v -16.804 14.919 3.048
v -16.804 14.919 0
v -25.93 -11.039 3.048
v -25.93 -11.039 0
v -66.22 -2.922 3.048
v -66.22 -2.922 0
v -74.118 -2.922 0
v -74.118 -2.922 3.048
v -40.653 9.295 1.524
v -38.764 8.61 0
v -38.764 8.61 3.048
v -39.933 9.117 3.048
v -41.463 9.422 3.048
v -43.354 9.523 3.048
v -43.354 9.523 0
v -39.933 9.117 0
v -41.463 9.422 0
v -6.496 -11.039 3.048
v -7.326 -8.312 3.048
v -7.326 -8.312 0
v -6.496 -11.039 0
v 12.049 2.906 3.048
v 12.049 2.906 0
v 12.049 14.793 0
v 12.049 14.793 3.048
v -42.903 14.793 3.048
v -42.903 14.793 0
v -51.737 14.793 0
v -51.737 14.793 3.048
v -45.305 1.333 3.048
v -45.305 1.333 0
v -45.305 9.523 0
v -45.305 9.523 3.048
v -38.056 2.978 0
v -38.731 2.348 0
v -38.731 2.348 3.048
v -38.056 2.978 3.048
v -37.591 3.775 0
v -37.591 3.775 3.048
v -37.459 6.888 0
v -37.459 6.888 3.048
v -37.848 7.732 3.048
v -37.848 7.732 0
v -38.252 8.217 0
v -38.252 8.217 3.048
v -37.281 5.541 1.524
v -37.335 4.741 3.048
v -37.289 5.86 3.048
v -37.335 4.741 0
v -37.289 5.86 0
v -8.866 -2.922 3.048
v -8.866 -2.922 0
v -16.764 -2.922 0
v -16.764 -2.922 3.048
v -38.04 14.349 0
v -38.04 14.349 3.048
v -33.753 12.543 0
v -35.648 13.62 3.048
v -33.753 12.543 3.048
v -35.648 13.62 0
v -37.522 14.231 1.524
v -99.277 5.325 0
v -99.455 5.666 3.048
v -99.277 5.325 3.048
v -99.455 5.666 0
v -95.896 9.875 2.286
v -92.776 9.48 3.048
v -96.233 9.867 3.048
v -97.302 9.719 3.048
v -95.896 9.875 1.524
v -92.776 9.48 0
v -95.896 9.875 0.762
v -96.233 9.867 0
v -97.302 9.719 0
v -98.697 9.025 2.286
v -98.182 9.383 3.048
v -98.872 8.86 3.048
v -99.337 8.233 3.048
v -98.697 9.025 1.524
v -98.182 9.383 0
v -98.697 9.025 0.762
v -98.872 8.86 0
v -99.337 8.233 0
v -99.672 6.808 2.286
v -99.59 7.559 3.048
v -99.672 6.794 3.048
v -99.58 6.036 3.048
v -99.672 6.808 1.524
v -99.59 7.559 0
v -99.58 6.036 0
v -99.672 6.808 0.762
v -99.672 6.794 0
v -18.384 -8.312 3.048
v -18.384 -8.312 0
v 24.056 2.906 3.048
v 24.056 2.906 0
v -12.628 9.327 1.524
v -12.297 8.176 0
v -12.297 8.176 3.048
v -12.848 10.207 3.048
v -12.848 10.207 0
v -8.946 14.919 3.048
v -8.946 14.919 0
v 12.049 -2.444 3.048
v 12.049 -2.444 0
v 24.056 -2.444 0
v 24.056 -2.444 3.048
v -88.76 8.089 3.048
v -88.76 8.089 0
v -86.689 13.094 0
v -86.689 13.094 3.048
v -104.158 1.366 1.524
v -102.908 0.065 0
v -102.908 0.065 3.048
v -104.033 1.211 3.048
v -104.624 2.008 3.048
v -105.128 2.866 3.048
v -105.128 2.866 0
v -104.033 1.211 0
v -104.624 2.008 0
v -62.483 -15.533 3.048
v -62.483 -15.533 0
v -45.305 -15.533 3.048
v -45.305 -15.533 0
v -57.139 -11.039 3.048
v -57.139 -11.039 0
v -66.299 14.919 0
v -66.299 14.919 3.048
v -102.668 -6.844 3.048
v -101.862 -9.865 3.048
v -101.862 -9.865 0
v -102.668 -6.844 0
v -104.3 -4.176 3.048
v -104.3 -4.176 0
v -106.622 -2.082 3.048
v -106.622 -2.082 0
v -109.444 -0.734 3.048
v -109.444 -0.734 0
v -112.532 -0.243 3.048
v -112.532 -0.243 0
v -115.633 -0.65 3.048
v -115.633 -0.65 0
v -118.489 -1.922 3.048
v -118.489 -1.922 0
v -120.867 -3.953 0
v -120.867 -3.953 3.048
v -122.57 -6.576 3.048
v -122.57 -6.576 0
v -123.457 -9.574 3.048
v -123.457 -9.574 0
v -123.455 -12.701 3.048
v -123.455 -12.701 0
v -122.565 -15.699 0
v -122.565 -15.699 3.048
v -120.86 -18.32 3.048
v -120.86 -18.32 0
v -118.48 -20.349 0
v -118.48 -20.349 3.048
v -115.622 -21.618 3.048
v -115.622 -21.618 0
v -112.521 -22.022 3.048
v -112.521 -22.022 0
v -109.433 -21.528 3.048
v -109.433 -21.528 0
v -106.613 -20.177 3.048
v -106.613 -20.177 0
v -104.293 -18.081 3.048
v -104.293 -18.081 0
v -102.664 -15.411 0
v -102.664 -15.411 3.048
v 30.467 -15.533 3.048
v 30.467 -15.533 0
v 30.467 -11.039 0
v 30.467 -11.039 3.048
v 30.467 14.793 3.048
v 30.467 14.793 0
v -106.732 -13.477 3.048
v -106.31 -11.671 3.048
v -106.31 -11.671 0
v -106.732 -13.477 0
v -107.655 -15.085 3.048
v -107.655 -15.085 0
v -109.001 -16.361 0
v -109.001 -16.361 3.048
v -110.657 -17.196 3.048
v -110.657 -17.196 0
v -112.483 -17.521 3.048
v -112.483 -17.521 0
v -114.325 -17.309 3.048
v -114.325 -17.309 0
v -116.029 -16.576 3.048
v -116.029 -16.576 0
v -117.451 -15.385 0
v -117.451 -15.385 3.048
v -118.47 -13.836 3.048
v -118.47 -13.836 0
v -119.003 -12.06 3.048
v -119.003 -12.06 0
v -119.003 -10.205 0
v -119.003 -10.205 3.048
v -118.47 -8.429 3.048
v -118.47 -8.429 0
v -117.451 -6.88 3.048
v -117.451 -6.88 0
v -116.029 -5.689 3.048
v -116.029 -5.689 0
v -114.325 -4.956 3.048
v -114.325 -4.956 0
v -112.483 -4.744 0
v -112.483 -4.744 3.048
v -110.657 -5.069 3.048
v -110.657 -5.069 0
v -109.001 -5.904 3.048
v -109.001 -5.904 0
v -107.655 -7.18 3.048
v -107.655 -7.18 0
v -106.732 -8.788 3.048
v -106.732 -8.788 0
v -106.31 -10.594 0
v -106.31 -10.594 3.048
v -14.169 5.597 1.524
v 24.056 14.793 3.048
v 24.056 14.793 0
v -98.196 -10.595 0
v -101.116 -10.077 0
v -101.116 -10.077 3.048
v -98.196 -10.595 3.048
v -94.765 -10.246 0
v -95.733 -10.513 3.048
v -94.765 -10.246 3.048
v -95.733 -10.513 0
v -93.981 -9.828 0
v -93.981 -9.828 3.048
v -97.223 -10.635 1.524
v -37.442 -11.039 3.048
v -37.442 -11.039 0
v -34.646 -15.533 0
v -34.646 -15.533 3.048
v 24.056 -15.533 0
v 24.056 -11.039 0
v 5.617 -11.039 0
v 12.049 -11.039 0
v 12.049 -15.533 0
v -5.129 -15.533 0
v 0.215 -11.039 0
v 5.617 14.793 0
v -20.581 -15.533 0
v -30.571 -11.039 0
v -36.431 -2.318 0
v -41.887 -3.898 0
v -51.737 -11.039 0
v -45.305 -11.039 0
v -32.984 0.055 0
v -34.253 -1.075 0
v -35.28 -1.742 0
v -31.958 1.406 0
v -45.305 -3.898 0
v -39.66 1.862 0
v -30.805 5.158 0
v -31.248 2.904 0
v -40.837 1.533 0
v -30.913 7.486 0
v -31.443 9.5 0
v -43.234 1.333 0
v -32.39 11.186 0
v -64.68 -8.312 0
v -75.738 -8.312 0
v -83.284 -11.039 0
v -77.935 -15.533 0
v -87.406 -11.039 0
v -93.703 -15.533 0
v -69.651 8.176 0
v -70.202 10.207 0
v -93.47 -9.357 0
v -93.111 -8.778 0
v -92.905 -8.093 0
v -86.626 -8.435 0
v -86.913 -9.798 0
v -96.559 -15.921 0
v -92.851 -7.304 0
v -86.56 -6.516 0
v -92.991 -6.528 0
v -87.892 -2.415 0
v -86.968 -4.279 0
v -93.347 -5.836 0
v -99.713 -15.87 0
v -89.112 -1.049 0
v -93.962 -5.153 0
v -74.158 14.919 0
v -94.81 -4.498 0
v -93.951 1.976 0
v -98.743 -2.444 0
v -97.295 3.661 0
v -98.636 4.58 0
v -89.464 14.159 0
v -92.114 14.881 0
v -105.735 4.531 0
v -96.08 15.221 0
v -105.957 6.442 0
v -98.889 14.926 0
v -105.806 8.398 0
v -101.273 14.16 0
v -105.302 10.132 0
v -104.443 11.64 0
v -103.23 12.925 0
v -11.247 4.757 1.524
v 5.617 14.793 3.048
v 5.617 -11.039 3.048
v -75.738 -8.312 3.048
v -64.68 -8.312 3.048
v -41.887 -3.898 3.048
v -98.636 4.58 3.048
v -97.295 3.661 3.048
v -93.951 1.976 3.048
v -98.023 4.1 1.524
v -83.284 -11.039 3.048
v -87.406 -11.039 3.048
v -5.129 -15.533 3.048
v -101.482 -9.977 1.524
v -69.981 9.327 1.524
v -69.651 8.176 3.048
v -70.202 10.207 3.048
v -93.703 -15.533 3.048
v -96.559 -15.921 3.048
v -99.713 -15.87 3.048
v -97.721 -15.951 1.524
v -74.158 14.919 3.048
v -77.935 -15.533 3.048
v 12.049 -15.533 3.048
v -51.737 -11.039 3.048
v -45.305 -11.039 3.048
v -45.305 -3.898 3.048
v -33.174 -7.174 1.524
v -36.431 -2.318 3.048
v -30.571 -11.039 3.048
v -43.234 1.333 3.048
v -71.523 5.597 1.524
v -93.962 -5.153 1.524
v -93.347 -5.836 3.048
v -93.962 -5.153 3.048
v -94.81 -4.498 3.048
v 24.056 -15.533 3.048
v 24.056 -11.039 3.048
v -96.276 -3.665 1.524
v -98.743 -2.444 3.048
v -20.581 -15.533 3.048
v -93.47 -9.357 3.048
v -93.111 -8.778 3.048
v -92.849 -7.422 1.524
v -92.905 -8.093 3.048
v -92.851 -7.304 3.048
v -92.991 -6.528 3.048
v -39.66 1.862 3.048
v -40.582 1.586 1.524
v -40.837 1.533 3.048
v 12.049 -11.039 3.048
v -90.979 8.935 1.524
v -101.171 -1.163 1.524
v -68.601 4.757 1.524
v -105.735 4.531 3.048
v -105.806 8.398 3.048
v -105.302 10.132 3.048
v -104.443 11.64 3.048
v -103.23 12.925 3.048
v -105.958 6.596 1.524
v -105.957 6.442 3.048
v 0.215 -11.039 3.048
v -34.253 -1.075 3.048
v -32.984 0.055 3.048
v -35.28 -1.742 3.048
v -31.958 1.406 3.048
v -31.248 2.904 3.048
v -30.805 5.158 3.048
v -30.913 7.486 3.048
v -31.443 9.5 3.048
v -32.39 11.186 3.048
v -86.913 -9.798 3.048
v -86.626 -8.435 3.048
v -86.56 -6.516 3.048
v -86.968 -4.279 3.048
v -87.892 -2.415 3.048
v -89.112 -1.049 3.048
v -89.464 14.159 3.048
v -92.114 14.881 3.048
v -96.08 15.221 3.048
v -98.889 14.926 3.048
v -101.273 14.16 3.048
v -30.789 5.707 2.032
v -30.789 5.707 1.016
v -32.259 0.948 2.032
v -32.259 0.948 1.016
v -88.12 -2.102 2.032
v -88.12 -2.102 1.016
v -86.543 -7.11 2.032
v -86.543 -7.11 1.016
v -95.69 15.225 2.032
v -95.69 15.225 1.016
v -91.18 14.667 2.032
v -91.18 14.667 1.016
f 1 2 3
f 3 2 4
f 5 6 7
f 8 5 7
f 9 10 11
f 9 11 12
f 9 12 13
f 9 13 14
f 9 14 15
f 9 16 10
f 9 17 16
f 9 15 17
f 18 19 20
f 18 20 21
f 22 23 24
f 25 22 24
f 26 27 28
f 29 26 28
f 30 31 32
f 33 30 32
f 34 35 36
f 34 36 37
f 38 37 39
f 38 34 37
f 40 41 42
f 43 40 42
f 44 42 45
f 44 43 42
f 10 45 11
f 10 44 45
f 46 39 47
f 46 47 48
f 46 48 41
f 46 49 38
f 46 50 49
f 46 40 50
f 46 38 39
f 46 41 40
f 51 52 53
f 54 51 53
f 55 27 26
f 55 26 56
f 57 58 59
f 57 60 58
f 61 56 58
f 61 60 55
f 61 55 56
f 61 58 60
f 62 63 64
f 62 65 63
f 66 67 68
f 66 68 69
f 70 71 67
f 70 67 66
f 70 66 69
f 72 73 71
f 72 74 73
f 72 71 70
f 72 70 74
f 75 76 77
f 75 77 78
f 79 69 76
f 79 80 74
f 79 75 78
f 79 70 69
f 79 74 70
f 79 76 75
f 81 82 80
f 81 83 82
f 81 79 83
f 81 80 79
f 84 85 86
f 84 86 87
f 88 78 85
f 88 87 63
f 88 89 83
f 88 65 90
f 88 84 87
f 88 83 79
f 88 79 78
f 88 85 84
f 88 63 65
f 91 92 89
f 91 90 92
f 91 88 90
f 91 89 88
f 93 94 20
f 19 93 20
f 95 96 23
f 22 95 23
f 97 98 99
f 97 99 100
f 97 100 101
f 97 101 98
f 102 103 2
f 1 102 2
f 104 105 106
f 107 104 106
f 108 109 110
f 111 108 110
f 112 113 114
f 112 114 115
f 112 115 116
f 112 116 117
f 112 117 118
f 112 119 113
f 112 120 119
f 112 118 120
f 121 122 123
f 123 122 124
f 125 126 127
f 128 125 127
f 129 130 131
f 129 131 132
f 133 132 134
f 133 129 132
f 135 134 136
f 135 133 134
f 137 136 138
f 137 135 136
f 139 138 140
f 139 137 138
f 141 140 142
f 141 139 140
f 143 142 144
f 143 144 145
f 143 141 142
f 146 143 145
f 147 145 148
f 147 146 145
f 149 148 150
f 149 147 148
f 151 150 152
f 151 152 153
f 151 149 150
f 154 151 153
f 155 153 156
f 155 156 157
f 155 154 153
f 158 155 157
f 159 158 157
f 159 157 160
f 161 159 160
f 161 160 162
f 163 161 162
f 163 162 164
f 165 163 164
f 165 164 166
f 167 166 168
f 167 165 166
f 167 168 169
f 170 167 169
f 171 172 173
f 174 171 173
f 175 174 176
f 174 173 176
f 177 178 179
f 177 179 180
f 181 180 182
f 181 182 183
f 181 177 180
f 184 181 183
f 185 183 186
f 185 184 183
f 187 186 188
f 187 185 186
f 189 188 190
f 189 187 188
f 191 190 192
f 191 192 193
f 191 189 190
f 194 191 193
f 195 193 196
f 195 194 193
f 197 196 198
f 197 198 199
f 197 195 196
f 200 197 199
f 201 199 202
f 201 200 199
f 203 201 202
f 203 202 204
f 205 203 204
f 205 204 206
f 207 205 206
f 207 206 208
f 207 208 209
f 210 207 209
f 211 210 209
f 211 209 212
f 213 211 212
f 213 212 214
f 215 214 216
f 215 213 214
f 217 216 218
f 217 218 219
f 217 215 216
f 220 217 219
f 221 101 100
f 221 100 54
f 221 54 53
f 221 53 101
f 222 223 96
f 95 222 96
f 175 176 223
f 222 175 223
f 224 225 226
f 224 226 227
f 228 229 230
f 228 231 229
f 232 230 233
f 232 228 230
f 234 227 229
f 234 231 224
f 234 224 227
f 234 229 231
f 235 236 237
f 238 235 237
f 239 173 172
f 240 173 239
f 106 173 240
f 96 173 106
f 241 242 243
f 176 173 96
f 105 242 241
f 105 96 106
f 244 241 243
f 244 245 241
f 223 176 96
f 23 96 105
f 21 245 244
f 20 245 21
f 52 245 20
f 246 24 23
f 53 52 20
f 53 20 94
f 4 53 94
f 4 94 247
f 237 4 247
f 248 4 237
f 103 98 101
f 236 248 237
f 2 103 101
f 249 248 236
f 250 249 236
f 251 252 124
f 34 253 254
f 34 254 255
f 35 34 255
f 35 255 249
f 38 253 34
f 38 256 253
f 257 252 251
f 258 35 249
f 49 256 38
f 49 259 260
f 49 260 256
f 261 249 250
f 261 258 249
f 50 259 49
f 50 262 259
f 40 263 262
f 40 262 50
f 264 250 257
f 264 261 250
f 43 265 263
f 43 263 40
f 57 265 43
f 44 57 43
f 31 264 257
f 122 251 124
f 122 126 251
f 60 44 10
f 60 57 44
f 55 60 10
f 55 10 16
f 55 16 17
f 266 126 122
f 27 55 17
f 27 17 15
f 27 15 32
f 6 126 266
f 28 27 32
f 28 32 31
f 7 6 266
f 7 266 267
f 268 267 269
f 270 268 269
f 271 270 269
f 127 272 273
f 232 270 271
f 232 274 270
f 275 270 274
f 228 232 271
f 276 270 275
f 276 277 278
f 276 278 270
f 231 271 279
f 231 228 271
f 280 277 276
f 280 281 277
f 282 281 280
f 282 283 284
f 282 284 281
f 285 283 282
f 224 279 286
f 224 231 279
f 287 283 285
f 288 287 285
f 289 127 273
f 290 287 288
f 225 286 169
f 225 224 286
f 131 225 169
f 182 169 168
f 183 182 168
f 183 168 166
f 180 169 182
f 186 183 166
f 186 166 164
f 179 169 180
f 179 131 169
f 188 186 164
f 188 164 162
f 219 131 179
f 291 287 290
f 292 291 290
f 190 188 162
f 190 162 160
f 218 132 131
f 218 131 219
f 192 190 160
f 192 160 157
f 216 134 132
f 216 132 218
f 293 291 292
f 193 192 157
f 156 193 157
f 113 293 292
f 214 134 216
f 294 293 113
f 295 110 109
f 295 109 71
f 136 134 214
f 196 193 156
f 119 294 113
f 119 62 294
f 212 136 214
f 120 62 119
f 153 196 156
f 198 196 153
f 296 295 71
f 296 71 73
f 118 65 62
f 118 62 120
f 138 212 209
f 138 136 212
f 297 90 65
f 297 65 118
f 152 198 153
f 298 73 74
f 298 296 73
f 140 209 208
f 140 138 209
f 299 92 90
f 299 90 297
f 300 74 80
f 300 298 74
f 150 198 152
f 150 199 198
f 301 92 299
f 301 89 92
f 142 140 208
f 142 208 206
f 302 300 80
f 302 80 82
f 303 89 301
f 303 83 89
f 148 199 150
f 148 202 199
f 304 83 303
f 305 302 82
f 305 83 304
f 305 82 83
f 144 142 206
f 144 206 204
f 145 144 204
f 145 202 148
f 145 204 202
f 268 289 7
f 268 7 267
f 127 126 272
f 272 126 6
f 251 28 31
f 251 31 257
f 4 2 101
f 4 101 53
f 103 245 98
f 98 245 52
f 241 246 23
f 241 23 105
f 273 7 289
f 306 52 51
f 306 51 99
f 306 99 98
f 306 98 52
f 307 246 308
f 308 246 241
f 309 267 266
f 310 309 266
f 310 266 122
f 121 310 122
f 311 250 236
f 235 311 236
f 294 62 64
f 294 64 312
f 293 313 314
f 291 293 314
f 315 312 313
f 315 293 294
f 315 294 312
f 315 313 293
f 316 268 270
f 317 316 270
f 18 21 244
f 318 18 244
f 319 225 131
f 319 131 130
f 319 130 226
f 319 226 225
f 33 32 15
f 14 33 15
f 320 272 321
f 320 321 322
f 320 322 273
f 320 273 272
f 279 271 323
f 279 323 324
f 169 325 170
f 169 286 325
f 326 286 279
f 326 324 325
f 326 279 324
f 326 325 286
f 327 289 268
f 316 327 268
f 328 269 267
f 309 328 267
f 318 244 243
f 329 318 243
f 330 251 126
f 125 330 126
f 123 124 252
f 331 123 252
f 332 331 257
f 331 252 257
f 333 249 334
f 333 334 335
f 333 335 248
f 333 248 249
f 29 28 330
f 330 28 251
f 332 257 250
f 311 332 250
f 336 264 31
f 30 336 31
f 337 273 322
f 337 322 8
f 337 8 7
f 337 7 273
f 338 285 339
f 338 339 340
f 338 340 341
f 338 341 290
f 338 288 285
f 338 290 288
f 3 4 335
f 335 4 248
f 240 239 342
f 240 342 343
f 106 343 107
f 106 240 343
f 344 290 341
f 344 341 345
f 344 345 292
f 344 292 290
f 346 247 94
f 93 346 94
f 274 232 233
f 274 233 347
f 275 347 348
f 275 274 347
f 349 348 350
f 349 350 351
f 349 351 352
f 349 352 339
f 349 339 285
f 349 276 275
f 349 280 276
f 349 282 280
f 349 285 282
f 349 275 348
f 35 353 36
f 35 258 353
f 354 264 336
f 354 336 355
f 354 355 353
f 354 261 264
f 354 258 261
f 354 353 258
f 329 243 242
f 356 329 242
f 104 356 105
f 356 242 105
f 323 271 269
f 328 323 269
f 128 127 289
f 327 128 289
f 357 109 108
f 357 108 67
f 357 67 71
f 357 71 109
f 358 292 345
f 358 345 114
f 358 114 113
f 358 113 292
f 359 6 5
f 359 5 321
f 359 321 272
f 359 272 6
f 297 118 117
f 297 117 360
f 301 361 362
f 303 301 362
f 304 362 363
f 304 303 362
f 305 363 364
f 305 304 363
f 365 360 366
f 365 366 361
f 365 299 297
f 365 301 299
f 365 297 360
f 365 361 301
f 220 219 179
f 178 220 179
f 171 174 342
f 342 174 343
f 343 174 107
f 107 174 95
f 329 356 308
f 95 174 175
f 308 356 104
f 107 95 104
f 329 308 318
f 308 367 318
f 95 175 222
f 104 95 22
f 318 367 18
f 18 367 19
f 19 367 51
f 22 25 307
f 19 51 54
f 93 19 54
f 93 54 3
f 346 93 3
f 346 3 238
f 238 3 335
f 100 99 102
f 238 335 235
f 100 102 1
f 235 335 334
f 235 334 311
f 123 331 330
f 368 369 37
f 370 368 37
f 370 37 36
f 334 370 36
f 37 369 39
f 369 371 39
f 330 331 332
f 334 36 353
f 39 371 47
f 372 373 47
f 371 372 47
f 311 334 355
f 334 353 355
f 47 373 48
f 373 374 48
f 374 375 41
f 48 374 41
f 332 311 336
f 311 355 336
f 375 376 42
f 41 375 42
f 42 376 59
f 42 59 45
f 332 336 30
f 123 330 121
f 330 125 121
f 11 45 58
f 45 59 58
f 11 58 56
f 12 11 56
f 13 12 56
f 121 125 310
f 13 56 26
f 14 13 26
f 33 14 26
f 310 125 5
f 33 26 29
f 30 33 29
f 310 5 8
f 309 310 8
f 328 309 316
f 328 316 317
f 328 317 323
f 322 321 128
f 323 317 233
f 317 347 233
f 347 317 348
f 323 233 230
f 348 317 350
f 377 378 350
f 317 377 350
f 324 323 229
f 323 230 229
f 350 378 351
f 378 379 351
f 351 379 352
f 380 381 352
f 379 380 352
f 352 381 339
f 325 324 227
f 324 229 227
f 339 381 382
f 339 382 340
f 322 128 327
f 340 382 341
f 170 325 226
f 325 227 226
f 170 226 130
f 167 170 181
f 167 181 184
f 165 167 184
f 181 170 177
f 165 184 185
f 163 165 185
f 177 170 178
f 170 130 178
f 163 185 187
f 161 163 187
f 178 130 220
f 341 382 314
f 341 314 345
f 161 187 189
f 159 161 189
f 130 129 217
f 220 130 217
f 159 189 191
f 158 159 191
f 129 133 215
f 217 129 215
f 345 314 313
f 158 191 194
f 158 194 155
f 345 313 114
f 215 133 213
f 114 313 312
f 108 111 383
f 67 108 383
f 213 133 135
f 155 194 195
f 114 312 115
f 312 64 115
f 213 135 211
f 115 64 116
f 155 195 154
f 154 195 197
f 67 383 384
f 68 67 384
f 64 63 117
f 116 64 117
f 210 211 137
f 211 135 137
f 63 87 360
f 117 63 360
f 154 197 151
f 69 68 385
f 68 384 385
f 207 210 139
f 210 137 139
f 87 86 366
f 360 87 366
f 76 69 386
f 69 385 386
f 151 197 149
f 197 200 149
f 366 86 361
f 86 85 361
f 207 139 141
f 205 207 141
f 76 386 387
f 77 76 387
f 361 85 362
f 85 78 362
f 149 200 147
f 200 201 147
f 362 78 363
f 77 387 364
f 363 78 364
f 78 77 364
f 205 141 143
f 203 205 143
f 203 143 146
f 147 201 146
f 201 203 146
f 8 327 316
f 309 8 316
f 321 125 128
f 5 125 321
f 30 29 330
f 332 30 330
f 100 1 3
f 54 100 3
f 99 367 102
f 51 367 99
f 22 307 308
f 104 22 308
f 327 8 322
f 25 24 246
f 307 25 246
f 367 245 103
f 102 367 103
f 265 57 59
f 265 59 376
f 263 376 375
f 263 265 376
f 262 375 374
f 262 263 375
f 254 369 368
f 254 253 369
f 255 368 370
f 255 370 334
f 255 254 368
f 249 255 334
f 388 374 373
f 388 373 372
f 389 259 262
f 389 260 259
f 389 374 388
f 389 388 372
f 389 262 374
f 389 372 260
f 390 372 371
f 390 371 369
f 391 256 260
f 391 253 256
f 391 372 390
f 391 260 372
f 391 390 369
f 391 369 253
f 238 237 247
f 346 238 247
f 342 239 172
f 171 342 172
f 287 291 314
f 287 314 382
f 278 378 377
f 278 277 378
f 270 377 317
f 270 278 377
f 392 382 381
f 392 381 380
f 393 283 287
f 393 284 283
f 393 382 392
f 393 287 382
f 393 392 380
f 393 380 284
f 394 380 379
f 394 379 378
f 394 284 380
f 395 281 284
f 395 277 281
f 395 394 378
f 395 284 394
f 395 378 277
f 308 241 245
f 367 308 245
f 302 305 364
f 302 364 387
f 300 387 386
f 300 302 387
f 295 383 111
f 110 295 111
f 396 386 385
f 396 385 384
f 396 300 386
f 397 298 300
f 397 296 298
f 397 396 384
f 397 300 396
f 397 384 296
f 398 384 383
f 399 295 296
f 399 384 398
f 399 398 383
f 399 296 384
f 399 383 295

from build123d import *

# Parameters (mm, degrees)
F0_W     = 6.4316435079
F0_H     = 4.493846558
F0_W_2   = 6.4117312989
F1_DEPTH = 3.048
F3_DEPTH = 3.048


with BuildPart() as f1:
    # F0 (on Top) → F1 (new body)
    with BuildSketch(Plane.XY):
        with BuildLine():
            add(Edge.make_bspline(
                [(-93.7031314291, -15.5330784619), (-95.5081773044, -15.9512348509), (-97.720823026, -15.9512348509)],
                knots=[0.5796214889, 0.5796214889, 0.5796214889, 1, 1, 1], degree=2))
            add(Edge.make_bspline(
                [(-89.5003994093, -13.5850006811), (-91.2143187275, -14.9565208538), (-93.7031314291, -15.5330784619)],
                knots=[0, 0, 0, 0.5796214889, 0.5796214889, 0.5796214889], degree=2))
            add(Edge.make_bspline(
                [(-87.4056067535, -11.0392319039), (-88.1401222991, -12.4964736558), (-89.5003994093, -13.5850006811)],
                knots=[0.539974936, 0.539974936, 0.539974936, 1, 1, 1], degree=2))
            add(Edge.make_bspline(
                [(-86.5434363724, -7.1102140537), (-86.5434363724, -9.3287294042), (-87.4056067535, -11.0392319039)],
                knots=[0, 0, 0, 0.539974936, 0.539974936, 0.539974936], degree=2))
            add(Edge.make_bspline(
                [(-88.1198195851, -2.1022934895), (-86.5434363724, -4.1432949123), (-86.5434363724, -7.1102140537)],
                knots=[0, 0, 0, 1, 1, 1], degree=2))
            add(Edge.make_bspline(
                [(-93.9507781214, 1.9763906546), (-89.6962027978, -0.0612920667), (-88.1198195851, -2.1022934895)],
                knots=[0, 0, 0, 1, 1, 1], degree=2))
            add(Edge.make_bspline(
                [(-98.0228248625, 4.1003596149), (-97.1632811739, 3.5096307478), (-93.9507781214, 1.9763906546)],
                knots=[0, 0, 0, 1, 1, 1], degree=2))
            add(Edge.make_bspline(
                [(-99.2772940297, 5.3249604686), (-98.8823685511, 4.691088482), (-98.0228248625, 4.1003596149)],
                knots=[0, 0, 0, 1, 1, 1], degree=2))
            add(Edge.make_bspline(
                [(-99.6722195082, 6.8084200393), (-99.6722195082, 5.9588324552), (-99.2772940297, 5.3249604686)],
                knots=[0, 0, 0, 1, 1, 1], degree=2))
            add(Edge.make_bspline(
                [(-98.6965212671, 9.0253126416), (-99.6722195082, 8.1757250575), (-99.6722195082, 6.8084200393)],
                knots=[0, 0, 0, 1, 1, 1], degree=2))
            add(Edge.make_bspline(
                [(-95.8955372007, 9.8749002257), (-97.720823026, 9.8749002257), (-98.6965212671, 9.0253126416)],
                knots=[0, 0, 0, 1, 1, 1], degree=2))
            add(Edge.make_bspline(
                [(-92.7759577903, 9.4799747472), (-94.3622971075, 9.8749002257), (-95.8955372007, 9.8749002257)],
                knots=[0, 0, 0, 1, 1, 1], degree=2))
            add(Edge.make_bspline(
                [(-88.7603289747, 8.0894388185), (-91.189618473, 9.0850492686), (-92.7759577903, 9.4799747472)],
                knots=[0, 0, 0, 1, 1, 1], degree=2))
            Line((-88.7603289747, 8.0894388185), (-86.6894592384, 13.0940406812))
            add(Edge.make_bspline(
                [(-91.1796623685, 14.6671051924), (-89.0324624977, 14.1095633403), (-86.6894592384, 13.0940406812)],
                knots=[0, 0, 0, 1, 1, 1], degree=2))
            add(Edge.make_bspline(
                [(-95.6897777077, 15.2246470445), (-93.3268622393, 15.2246470445), (-91.1796623685, 14.6671051924)],
                knots=[0, 0, 0, 1, 1, 1], degree=2))
            add(Edge.make_bspline(
                [(-103.2298675168, 12.9247869047), (-100.5018948834, 15.2246470445), (-95.6897777077, 15.2246470445)],
                knots=[0, 0, 0, 1, 1, 1], degree=2))
            add(Edge.make_bspline(
                [(-105.9578401501, 6.5960231433), (-105.9578401501, 10.6249267649), (-103.2298675168, 12.9247869047)],
                knots=[0, 0, 0, 1, 1, 1], degree=2))
            add(Edge.make_bspline(
                [(-105.128164775, 2.8658026567), (-105.9578401501, 4.46541678), (-105.9578401501, 6.5960231433)],
                knots=[0, 0, 0, 1, 1, 1], degree=2))
            add(Edge.make_bspline(
                [(-102.9079534712, 0.0648185903), (-104.2984893999, 1.2661885335), (-105.128164775, 2.8658026567)],
                knots=[0, 0, 0, 1, 1, 1], degree=2))
            add(Edge.make_bspline(
                [(-98.7429830881, -2.444119744), (-101.5174175425, -1.1365513528), (-102.9079534712, 0.0648185903)],
                knots=[0, 0, 0, 1, 1, 1], degree=2))
            add(Edge.make_bspline(
                [(-94.81032181, -4.4983959728), (-95.7760639467, -3.8578865832), (-98.7429830881, -2.444119744)],
                knots=[0, 0, 0, 1, 1, 1], degree=2))
            add(Edge.make_bspline(
                [(-93.3467744483, -5.8358326775), (-93.8445796734, -5.1389053624), (-94.81032181, -4.4983959728)],
                knots=[0, 0, 0, 1, 1, 1], degree=2))
            add(Edge.make_bspline(
                [(-92.8489692233, -7.4221719947), (-92.8489692233, -6.5327599926), (-93.3467744483, -5.8358326775)],
                knots=[0, 0, 0, 1, 1, 1], degree=2))
            add(Edge.make_bspline(
                [(-93.9806464349, -9.8282305826), (-92.8489692233, -9.021786118), (-92.8489692233, -7.4221719947)],
                knots=[0, 0, 0, 1, 1, 1], degree=2))
            add(Edge.make_bspline(
                [(-97.2230178009, -10.6346750472), (-95.1123236466, -10.6346750472), (-93.9806464349, -9.8282305826)],
                knots=[0, 0, 0, 1, 1, 1], degree=2))
            add(Edge.make_bspline(
                [(-101.1158546609, -10.0771331951), (-98.9885669991, -10.6346750472), (-97.2230178009, -10.6346750472)],
                knots=[0, 0, 0, 1, 1, 1], degree=2))
            add(Edge.make_bspline(
                [(-106.3096225092, -8.1456489218), (-103.2431423228, -9.519591343), (-101.1158546609, -10.0771331951)],
                knots=[0, 0, 0, 1, 1, 1], degree=2))
            Line((-106.3096225092, -8.1456489218), (-106.3096225092, -14.1193116227))
            add(Edge.make_bspline(
                [(-97.720823026, -15.9512348509), (-102.5794020227, -15.9512348509), (-106.3096225092, -14.1193116227)],
                knots=[0, 0, 0, 1, 1, 1], degree=2))
        make_face()
        with BuildLine():
            Line((-93.7031314291, -15.5330784619), (-84.8641734131, -15.5330784619))
            Line((-84.8641734131, -15.5330784619), (-83.2842748739, -11.0392319039))
            Line((-83.2842748739, -11.0392319039), (-87.4056067535, -11.0392319039))
            add(Edge.make_bspline(
                [(-87.4056067535, -11.0392319039), (-88.1401222991, -12.4964736558), (-89.5003994093, -13.5850006811)],
                knots=[0.539974936, 0.539974936, 0.539974936, 1, 1, 1], degree=2))
            add(Edge.make_bspline(
                [(-89.5003994093, -13.5850006811), (-91.2143187275, -14.9565208538), (-93.7031314291, -15.5330784619)],
                knots=[0, 0, 0, 0.5796214889, 0.5796214889, 0.5796214889], degree=2))
        make_face()
        Polygon((-83.2842748739, -11.0392319039), (-84.8641734131, -15.5330784619), (-77.9347246801, -15.5330784619), (-76.5675709938, -11.0392319039), align=None)
        Polygon((-74.1580423726, 14.9193265065), (-83.2842748739, -11.0392319039), (-76.5675709938, -11.0392319039), (-75.7377442868, -8.3115839969), (-64.6798308872, -8.3115839969), (-63.8500041802, -11.0392319039), (-57.1391771702, -11.0392319039), (-66.2993572195, 14.9193265065), align=None)
        with BuildLine():
            add(Edge.make_bspline(
                [(-66.2197083835, -2.9220127601), (-69.2662763609, 6.8880688753), (-69.651245735, 8.1757250575)],
                knots=[0, 0, 0, 1, 1, 1], degree=2))
            Line((-66.2197083835, -2.9220127601), (-74.1182179546, -2.9220127601))
            add(Edge.make_bspline(
                [(-70.202150184, 10.2067703758), (-70.8858026931, 7.5518091754), (-74.1182179546, -2.9220127601)],
                knots=[0, 0, 0, 1, 1, 1], degree=2))
            add(Edge.make_bspline(
                [(-69.651245735, 8.1757250575), (-70.036215109, 9.4633812397), (-70.202150184, 10.2067703758)],
                knots=[0, 0, 0, 1, 1, 1], degree=2))
        make_face(mode=Mode.SUBTRACT)
        Polygon((-63.8500041802, -11.0392319039), (-62.4828504939, -15.5330784619), (-55.5534017609, -15.5330784619), (-57.1391771702, -11.0392319039), align=None)
        Polygon((-57.1391771702, -11.0392319039), (-55.5534017609, -15.5330784619), (-51.7368950354, -15.5330784619), (-51.7368950354, -11.0392319039), align=None)
        with Locations((-48.5210732814, -13.2861551829)):
            Rectangle(F0_W, F0_H)
        with BuildLine():
            Line((-51.7368950354, 14.7932158494), (-51.7368950354, -11.0392319039))
            Line((-51.7368950354, -11.0392319039), (-45.3052515275, -11.0392319039))
            Line((-45.3052515275, -11.0392319039), (-45.3052515275, -3.8977110012))
            Line((-45.3052515275, -3.8977110012), (-41.886988982, -3.8977110012))
            Line((-41.886988982, -3.8977110012), (-37.4423801373, -11.0392319039))
            Line((-37.4423801373, -11.0392319039), (-30.5711537413, -11.0392319039))
            add(Edge.make_bspline(
                [(-36.4310437152, -2.318009087), (-32.8468856368, -7.6699350549), (-30.5711537413, -11.0392319039)],
                knots=[0, 0, 0, 0.5232500412, 0.5232500412, 0.5232500412], degree=2))
            add(Edge.make_bspline(
                [(-32.2594359291, 0.9475931895), (-33.7296206938, -1.1365513528), (-36.4310437152, -2.318009087)],
                knots=[0, 0, 0, 1, 1, 1], degree=2))
            add(Edge.make_bspline(
                [(-30.7892511644, 5.7066111411), (-30.7892511644, 3.0317377318), (-32.2594359291, 0.9475931895)],
                knots=[0, 0, 0, 1, 1, 1], degree=2))
            add(Edge.make_bspline(
                [(-33.7528516043, 12.5431362321), (-30.7892511644, 10.2930566148), (-30.7892511644, 5.7066111411)],
                knots=[0, 0, 0, 1, 1, 1], degree=2))
            add(Edge.make_bspline(
                [(-42.9025116411, 14.7932158494), (-36.7164520443, 14.7932158494), (-33.7528516043, 12.5431362321)],
                knots=[0, 0, 0, 1, 1, 1], degree=2))
            Line((-42.9025116411, 14.7932158494), (-51.7368950354, 14.7932158494))
        make_face()
        with BuildLine():
            Line((-43.2343817912, 1.3325625635), (-45.3052515275, 1.3325625635))
            Line((-45.3052515275, 1.3325625635), (-45.3052515275, 9.5231178667))
            Line((-45.3052515275, 9.5231178667), (-43.3538550452, 9.5231178667))
            add(Edge.make_bspline(
                [(-38.76409087, 8.6104749541), (-40.2475504408, 9.5231178667), (-43.3538550452, 9.5231178667)],
                knots=[0, 0, 0, 1, 1, 1], degree=2))
            add(Edge.make_bspline(
                [(-37.2806312993, 5.5406760661), (-37.2806312993, 7.6978320414), (-38.76409087, 8.6104749541)],
                knots=[0, 0, 0, 1, 1, 1], degree=2))
            add(Edge.make_bspline(
                [(-38.730903855, 2.3480852227), (-37.2806312993, 3.3636078818), (-37.2806312993, 5.5406760661)],
                knots=[0, 0, 0, 1, 1, 1], degree=2))
            add(Edge.make_bspline(
                [(-43.2343817912, 1.3325625635), (-40.1811764107, 1.3325625635), (-38.730903855, 2.3480852227)],
                knots=[0, 0, 0, 1, 1, 1], degree=2))
        make_face(mode=Mode.SUBTRACT)
        with BuildLine():
            Line((-37.4423801373, -11.0392319039), (-34.645582308, -15.5330784619))
            Line((-34.645582308, -15.5330784619), (-27.5103740819, -15.5330784619))
            add(Edge.make_bspline(
                [(-30.5711537413, -11.0392319039), (-28.4976611434, -14.1091067387), (-27.5103740819, -15.5330784619)],
                knots=[0.5232500412, 0.5232500412, 0.5232500412, 1, 1, 1], degree=2))
            Line((-30.5711537413, -11.0392319039), (-37.4423801373, -11.0392319039))
        make_face()
        Polygon((-25.9304755427, -11.0392319039), (-27.5103740819, -15.5330784619), (-20.5809253489, -15.5330784619), (-19.2137716626, -11.0392319039), align=None)
        Polygon((-16.8042430414, 14.9193265065), (-25.9304755427, -11.0392319039), (-19.2137716626, -11.0392319039), (-18.3839449556, -8.3115839969), (-7.3260315561, -8.3115839969), (-6.4962048491, -11.0392319039), (0.214622161, -11.0392319039), (-8.9455578883, 14.9193265065), align=None)
        with BuildLine():
            add(Edge.make_bspline(
                [(-8.8659090523, -2.9220127601), (-11.9124770297, 6.8880688753), (-12.2974464038, 8.1757250575)],
                knots=[0, 0, 0, 1, 1, 1], degree=2))
            Line((-8.8659090523, -2.9220127601), (-16.7644186234, -2.9220127601))
            add(Edge.make_bspline(
                [(-12.8483508528, 10.2067703758), (-13.5320033619, 7.5518091754), (-16.7644186234, -2.9220127601)],
                knots=[0, 0, 0, 1, 1, 1], degree=2))
            add(Edge.make_bspline(
                [(-12.2974464038, 8.1757250575), (-12.6824157778, 9.4633812397), (-12.8483508528, 10.2067703758)],
                knots=[0, 0, 0, 1, 1, 1], degree=2))
        make_face(mode=Mode.SUBTRACT)
        Polygon((-6.4962048491, -11.0392319039), (-5.1290511627, -15.5330784619), (1.8003975703, -15.5330784619), (0.214622161, -11.0392319039), align=None)
        with Locations((8.8327260498, -13.2861551829)):
            Rectangle(F0_W, F0_H)
        Polygon((5.6169042958, 14.7932158494), (5.6169042958, -11.0392319039), (12.0485478037, -11.0392319039), (12.0485478037, -2.444119744), (24.0556098324, -2.444119744), (24.0556098324, -11.0392319039), (30.4673411313, -11.0392319039), (30.4673411313, 14.7932158494), (24.0556098324, 14.7932158494), (24.0556098324, 2.9056270747), (12.0485478037, 2.9056270747), (12.0485478037, 14.7932158494), align=None)
        with Locations((27.2614754819, -13.2861551829)):
            Rectangle(F0_W_2, F0_H)
        Polygon((0.214622161, -11.0392319039), (1.8003975703, -15.5330784619), (5.6169042958, -15.5330784619), (5.6169042958, -11.0392319039), align=None)
        with BuildLine():
            add(Edge.make_bspline(
                [(-30.5711537413, -11.0392319039), (-28.4976611434, -14.1091067387), (-27.5103740819, -15.5330784619)],
                knots=[0.5232500412, 0.5232500412, 0.5232500412, 1, 1, 1], degree=2))
            Line((-27.5103740819, -15.5330784619), (-25.9304755427, -11.0392319039))
            Line((-25.9304755427, -11.0392319039), (-30.5711537413, -11.0392319039))
        make_face()
    extrude(amount=F1_DEPTH)

    # F2 (on face) → F3 (join)
    with BuildSketch(Plane.XY.offset(3.048)):
        with BuildLine():
            add(Edge.make_bspline(
                [(-101.8623637859, -9.8651655257), (-103.7618212116, -9.2871962565), (-106.3096225092, -8.1456489218)],
                knots=[8.3558901367, 8.3558901367, 8.3558901367, 9.6058387309, 9.6058387309, 9.6058387309], degree=2))
            ThreePointArc((-101.8623637859, -9.8651655257), (-123.4569962159, -9.5743296119), (-102.6641187967, -15.4111938339))
            add(Edge.make_bspline(
                [(-106.3096225092, -14.1193116227), (-104.6047247744, -14.9565923608), (-102.6641187967, -15.4111938339)],
                knots=[0, 0, 0, 0.4570501237, 0.4570501237, 0.4570501237], degree=2))
            Line((-106.3096225092, -14.1193116227), (-106.3096225092, -11.6707719543))
            ThreePointArc((-106.3096225092, -11.6707719543), (-119.0704975277, -11.1324802723), (-106.3096225092, -10.5941885902))
            Line((-106.3096225092, -10.5941885902), (-106.3096225092, -8.1456489218))
        make_face()
    extrude(amount=-F3_DEPTH)


solid = f1.part
